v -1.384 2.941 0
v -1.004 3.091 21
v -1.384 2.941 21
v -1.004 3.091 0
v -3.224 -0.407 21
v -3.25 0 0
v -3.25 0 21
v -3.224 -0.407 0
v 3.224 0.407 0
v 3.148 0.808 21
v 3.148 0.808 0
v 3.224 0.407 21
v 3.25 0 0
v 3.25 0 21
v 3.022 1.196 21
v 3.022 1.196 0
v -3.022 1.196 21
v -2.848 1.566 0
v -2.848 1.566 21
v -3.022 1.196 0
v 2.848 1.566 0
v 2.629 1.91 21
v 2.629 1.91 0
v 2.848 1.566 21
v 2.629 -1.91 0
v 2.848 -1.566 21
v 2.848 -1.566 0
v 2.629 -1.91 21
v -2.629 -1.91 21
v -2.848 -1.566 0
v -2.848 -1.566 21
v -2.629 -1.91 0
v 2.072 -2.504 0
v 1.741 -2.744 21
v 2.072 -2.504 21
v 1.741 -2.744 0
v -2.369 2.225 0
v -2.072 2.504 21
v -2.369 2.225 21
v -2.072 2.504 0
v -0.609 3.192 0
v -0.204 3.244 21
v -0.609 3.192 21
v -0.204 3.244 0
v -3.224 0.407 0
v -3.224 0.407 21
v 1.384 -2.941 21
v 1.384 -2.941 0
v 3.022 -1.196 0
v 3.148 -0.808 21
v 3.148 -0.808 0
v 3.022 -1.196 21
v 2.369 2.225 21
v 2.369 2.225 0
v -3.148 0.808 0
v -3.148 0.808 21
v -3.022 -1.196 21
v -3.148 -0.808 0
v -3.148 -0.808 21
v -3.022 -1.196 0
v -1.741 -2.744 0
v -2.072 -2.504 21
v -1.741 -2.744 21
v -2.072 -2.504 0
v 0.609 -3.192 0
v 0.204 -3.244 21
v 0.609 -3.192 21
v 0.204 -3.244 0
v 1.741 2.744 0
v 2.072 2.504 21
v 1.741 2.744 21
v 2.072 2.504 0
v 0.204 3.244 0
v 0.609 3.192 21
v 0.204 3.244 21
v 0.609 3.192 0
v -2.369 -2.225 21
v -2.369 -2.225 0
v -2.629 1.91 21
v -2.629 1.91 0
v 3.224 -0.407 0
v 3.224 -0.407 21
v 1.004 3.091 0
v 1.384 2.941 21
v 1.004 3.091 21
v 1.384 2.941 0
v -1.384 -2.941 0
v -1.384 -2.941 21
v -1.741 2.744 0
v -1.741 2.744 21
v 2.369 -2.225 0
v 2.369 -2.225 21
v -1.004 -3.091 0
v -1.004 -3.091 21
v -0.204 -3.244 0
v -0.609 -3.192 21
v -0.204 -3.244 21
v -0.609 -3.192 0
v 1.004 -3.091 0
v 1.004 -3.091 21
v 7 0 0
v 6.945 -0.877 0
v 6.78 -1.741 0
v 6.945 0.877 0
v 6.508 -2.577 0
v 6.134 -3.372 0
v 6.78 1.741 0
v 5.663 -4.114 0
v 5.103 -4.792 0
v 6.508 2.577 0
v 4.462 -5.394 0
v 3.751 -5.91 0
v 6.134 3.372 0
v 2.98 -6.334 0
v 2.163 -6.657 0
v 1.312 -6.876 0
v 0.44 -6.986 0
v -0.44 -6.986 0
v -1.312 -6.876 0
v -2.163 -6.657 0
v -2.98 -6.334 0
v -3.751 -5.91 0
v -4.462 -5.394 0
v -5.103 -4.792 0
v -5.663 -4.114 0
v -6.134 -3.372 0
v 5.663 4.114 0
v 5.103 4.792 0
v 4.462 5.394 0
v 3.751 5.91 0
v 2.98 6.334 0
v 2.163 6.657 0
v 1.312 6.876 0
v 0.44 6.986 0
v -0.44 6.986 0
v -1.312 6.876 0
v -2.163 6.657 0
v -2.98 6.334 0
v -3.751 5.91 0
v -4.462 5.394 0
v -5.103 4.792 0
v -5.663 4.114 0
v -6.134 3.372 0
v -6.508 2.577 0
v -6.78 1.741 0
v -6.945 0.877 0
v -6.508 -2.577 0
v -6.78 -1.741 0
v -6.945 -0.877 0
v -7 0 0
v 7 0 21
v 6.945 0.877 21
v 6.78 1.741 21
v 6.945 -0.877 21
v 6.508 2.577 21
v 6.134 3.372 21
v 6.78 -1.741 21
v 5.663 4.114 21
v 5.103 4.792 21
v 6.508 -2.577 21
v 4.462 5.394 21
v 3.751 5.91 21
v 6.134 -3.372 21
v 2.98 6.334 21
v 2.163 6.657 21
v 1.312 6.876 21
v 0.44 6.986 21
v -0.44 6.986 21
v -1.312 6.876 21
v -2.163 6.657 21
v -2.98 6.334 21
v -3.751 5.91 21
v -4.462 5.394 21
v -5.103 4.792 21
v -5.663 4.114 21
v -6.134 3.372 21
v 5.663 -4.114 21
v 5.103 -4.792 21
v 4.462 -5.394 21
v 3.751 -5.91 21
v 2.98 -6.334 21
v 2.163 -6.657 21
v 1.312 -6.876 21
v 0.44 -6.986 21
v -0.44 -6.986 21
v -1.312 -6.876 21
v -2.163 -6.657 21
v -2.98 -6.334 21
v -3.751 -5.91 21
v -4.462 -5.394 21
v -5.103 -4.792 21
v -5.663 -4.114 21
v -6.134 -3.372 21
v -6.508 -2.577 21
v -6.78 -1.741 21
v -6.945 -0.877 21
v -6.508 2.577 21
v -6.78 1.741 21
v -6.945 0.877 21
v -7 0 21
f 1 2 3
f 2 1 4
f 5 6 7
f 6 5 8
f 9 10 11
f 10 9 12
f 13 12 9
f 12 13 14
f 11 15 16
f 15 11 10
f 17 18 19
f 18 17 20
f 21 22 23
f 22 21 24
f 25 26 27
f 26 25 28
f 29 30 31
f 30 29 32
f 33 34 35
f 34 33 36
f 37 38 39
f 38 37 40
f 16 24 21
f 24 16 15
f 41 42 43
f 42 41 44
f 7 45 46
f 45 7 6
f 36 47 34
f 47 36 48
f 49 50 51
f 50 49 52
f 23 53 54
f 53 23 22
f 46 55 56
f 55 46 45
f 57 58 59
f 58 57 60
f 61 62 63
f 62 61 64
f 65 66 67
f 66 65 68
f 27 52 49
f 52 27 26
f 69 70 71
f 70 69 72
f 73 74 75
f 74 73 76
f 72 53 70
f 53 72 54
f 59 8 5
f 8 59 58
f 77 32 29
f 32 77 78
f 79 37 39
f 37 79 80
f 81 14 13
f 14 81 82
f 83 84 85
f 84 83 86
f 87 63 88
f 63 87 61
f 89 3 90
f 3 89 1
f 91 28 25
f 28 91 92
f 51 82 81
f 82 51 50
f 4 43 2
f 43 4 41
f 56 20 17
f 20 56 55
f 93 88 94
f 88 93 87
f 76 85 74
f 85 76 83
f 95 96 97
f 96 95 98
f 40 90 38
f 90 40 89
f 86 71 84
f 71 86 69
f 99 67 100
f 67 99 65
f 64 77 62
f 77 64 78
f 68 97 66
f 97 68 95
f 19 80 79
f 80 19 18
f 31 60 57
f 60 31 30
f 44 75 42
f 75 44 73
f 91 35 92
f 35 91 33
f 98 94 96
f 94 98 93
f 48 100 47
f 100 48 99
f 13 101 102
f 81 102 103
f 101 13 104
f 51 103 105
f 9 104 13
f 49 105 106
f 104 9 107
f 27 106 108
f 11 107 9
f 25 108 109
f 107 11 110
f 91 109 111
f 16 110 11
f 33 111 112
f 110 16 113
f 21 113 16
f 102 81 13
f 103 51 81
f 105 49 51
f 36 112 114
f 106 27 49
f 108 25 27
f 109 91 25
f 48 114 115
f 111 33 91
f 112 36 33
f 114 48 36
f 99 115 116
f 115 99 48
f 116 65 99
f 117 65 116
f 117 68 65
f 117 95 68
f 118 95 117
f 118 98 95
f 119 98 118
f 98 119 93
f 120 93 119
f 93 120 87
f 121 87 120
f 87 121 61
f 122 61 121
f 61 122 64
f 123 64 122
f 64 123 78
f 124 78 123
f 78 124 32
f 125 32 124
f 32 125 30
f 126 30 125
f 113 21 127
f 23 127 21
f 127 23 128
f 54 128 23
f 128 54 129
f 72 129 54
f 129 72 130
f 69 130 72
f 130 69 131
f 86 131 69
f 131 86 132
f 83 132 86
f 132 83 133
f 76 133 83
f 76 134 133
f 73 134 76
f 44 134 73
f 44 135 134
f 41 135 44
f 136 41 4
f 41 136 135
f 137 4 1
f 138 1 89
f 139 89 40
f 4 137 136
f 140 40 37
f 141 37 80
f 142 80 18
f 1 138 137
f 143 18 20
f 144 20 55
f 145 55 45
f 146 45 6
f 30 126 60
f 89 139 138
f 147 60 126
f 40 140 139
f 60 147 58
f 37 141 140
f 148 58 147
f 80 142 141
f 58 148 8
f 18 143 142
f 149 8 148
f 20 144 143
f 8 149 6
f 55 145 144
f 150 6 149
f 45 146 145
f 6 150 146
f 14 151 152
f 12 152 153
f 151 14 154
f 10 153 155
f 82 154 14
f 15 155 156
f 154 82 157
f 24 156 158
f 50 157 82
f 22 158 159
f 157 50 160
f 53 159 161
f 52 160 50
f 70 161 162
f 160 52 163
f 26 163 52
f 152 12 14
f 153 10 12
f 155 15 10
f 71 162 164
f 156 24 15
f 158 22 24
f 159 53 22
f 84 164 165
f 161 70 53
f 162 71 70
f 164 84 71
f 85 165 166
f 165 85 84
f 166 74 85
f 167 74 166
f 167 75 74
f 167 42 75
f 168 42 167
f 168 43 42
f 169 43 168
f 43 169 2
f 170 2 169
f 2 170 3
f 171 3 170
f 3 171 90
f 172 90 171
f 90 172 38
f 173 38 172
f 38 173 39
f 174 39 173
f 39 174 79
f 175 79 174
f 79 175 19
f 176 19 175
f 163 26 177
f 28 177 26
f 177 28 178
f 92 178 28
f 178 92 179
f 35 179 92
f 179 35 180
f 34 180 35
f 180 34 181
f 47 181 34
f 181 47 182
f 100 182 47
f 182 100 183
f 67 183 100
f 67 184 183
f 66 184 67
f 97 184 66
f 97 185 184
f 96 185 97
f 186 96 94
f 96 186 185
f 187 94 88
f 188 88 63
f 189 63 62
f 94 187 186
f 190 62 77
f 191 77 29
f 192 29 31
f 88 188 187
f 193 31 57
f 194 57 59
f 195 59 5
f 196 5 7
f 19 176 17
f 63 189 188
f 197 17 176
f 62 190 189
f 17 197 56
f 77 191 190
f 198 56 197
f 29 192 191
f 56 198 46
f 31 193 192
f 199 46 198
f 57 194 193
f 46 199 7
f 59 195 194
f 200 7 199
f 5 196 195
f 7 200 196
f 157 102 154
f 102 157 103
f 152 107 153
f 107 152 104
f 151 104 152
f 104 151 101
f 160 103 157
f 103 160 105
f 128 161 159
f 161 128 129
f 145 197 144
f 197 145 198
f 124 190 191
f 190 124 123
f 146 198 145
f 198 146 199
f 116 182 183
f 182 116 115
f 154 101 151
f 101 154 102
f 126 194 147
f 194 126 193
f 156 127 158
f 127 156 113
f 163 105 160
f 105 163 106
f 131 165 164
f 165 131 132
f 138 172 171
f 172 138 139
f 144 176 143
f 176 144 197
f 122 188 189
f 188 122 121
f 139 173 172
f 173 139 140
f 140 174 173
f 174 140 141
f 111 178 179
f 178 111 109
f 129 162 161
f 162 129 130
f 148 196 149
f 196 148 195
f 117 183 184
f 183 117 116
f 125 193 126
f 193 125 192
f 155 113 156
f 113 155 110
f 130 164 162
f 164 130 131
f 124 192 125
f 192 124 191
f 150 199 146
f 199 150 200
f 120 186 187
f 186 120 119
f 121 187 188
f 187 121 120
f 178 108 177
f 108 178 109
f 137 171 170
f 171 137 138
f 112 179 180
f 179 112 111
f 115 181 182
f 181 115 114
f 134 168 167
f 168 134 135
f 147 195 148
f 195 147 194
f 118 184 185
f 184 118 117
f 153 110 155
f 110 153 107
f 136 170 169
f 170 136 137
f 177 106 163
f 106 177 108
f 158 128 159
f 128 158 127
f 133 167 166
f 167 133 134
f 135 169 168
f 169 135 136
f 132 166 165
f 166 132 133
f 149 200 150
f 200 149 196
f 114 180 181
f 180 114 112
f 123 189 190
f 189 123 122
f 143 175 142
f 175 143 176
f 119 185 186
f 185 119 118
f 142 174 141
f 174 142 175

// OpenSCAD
$fn = 50;


difference() {
	union() {
		cylinder(h = 21, r = 7.0000000000);
	}
	union() {
		cylinder(h = 21, r = 3.2500000000);
		cylinder(h = 21, r = 1.8000000000);
		cylinder(h = 21, r = 1.8000000000);
		cylinder(h = 21, r = 1.8000000000);
	}
}
